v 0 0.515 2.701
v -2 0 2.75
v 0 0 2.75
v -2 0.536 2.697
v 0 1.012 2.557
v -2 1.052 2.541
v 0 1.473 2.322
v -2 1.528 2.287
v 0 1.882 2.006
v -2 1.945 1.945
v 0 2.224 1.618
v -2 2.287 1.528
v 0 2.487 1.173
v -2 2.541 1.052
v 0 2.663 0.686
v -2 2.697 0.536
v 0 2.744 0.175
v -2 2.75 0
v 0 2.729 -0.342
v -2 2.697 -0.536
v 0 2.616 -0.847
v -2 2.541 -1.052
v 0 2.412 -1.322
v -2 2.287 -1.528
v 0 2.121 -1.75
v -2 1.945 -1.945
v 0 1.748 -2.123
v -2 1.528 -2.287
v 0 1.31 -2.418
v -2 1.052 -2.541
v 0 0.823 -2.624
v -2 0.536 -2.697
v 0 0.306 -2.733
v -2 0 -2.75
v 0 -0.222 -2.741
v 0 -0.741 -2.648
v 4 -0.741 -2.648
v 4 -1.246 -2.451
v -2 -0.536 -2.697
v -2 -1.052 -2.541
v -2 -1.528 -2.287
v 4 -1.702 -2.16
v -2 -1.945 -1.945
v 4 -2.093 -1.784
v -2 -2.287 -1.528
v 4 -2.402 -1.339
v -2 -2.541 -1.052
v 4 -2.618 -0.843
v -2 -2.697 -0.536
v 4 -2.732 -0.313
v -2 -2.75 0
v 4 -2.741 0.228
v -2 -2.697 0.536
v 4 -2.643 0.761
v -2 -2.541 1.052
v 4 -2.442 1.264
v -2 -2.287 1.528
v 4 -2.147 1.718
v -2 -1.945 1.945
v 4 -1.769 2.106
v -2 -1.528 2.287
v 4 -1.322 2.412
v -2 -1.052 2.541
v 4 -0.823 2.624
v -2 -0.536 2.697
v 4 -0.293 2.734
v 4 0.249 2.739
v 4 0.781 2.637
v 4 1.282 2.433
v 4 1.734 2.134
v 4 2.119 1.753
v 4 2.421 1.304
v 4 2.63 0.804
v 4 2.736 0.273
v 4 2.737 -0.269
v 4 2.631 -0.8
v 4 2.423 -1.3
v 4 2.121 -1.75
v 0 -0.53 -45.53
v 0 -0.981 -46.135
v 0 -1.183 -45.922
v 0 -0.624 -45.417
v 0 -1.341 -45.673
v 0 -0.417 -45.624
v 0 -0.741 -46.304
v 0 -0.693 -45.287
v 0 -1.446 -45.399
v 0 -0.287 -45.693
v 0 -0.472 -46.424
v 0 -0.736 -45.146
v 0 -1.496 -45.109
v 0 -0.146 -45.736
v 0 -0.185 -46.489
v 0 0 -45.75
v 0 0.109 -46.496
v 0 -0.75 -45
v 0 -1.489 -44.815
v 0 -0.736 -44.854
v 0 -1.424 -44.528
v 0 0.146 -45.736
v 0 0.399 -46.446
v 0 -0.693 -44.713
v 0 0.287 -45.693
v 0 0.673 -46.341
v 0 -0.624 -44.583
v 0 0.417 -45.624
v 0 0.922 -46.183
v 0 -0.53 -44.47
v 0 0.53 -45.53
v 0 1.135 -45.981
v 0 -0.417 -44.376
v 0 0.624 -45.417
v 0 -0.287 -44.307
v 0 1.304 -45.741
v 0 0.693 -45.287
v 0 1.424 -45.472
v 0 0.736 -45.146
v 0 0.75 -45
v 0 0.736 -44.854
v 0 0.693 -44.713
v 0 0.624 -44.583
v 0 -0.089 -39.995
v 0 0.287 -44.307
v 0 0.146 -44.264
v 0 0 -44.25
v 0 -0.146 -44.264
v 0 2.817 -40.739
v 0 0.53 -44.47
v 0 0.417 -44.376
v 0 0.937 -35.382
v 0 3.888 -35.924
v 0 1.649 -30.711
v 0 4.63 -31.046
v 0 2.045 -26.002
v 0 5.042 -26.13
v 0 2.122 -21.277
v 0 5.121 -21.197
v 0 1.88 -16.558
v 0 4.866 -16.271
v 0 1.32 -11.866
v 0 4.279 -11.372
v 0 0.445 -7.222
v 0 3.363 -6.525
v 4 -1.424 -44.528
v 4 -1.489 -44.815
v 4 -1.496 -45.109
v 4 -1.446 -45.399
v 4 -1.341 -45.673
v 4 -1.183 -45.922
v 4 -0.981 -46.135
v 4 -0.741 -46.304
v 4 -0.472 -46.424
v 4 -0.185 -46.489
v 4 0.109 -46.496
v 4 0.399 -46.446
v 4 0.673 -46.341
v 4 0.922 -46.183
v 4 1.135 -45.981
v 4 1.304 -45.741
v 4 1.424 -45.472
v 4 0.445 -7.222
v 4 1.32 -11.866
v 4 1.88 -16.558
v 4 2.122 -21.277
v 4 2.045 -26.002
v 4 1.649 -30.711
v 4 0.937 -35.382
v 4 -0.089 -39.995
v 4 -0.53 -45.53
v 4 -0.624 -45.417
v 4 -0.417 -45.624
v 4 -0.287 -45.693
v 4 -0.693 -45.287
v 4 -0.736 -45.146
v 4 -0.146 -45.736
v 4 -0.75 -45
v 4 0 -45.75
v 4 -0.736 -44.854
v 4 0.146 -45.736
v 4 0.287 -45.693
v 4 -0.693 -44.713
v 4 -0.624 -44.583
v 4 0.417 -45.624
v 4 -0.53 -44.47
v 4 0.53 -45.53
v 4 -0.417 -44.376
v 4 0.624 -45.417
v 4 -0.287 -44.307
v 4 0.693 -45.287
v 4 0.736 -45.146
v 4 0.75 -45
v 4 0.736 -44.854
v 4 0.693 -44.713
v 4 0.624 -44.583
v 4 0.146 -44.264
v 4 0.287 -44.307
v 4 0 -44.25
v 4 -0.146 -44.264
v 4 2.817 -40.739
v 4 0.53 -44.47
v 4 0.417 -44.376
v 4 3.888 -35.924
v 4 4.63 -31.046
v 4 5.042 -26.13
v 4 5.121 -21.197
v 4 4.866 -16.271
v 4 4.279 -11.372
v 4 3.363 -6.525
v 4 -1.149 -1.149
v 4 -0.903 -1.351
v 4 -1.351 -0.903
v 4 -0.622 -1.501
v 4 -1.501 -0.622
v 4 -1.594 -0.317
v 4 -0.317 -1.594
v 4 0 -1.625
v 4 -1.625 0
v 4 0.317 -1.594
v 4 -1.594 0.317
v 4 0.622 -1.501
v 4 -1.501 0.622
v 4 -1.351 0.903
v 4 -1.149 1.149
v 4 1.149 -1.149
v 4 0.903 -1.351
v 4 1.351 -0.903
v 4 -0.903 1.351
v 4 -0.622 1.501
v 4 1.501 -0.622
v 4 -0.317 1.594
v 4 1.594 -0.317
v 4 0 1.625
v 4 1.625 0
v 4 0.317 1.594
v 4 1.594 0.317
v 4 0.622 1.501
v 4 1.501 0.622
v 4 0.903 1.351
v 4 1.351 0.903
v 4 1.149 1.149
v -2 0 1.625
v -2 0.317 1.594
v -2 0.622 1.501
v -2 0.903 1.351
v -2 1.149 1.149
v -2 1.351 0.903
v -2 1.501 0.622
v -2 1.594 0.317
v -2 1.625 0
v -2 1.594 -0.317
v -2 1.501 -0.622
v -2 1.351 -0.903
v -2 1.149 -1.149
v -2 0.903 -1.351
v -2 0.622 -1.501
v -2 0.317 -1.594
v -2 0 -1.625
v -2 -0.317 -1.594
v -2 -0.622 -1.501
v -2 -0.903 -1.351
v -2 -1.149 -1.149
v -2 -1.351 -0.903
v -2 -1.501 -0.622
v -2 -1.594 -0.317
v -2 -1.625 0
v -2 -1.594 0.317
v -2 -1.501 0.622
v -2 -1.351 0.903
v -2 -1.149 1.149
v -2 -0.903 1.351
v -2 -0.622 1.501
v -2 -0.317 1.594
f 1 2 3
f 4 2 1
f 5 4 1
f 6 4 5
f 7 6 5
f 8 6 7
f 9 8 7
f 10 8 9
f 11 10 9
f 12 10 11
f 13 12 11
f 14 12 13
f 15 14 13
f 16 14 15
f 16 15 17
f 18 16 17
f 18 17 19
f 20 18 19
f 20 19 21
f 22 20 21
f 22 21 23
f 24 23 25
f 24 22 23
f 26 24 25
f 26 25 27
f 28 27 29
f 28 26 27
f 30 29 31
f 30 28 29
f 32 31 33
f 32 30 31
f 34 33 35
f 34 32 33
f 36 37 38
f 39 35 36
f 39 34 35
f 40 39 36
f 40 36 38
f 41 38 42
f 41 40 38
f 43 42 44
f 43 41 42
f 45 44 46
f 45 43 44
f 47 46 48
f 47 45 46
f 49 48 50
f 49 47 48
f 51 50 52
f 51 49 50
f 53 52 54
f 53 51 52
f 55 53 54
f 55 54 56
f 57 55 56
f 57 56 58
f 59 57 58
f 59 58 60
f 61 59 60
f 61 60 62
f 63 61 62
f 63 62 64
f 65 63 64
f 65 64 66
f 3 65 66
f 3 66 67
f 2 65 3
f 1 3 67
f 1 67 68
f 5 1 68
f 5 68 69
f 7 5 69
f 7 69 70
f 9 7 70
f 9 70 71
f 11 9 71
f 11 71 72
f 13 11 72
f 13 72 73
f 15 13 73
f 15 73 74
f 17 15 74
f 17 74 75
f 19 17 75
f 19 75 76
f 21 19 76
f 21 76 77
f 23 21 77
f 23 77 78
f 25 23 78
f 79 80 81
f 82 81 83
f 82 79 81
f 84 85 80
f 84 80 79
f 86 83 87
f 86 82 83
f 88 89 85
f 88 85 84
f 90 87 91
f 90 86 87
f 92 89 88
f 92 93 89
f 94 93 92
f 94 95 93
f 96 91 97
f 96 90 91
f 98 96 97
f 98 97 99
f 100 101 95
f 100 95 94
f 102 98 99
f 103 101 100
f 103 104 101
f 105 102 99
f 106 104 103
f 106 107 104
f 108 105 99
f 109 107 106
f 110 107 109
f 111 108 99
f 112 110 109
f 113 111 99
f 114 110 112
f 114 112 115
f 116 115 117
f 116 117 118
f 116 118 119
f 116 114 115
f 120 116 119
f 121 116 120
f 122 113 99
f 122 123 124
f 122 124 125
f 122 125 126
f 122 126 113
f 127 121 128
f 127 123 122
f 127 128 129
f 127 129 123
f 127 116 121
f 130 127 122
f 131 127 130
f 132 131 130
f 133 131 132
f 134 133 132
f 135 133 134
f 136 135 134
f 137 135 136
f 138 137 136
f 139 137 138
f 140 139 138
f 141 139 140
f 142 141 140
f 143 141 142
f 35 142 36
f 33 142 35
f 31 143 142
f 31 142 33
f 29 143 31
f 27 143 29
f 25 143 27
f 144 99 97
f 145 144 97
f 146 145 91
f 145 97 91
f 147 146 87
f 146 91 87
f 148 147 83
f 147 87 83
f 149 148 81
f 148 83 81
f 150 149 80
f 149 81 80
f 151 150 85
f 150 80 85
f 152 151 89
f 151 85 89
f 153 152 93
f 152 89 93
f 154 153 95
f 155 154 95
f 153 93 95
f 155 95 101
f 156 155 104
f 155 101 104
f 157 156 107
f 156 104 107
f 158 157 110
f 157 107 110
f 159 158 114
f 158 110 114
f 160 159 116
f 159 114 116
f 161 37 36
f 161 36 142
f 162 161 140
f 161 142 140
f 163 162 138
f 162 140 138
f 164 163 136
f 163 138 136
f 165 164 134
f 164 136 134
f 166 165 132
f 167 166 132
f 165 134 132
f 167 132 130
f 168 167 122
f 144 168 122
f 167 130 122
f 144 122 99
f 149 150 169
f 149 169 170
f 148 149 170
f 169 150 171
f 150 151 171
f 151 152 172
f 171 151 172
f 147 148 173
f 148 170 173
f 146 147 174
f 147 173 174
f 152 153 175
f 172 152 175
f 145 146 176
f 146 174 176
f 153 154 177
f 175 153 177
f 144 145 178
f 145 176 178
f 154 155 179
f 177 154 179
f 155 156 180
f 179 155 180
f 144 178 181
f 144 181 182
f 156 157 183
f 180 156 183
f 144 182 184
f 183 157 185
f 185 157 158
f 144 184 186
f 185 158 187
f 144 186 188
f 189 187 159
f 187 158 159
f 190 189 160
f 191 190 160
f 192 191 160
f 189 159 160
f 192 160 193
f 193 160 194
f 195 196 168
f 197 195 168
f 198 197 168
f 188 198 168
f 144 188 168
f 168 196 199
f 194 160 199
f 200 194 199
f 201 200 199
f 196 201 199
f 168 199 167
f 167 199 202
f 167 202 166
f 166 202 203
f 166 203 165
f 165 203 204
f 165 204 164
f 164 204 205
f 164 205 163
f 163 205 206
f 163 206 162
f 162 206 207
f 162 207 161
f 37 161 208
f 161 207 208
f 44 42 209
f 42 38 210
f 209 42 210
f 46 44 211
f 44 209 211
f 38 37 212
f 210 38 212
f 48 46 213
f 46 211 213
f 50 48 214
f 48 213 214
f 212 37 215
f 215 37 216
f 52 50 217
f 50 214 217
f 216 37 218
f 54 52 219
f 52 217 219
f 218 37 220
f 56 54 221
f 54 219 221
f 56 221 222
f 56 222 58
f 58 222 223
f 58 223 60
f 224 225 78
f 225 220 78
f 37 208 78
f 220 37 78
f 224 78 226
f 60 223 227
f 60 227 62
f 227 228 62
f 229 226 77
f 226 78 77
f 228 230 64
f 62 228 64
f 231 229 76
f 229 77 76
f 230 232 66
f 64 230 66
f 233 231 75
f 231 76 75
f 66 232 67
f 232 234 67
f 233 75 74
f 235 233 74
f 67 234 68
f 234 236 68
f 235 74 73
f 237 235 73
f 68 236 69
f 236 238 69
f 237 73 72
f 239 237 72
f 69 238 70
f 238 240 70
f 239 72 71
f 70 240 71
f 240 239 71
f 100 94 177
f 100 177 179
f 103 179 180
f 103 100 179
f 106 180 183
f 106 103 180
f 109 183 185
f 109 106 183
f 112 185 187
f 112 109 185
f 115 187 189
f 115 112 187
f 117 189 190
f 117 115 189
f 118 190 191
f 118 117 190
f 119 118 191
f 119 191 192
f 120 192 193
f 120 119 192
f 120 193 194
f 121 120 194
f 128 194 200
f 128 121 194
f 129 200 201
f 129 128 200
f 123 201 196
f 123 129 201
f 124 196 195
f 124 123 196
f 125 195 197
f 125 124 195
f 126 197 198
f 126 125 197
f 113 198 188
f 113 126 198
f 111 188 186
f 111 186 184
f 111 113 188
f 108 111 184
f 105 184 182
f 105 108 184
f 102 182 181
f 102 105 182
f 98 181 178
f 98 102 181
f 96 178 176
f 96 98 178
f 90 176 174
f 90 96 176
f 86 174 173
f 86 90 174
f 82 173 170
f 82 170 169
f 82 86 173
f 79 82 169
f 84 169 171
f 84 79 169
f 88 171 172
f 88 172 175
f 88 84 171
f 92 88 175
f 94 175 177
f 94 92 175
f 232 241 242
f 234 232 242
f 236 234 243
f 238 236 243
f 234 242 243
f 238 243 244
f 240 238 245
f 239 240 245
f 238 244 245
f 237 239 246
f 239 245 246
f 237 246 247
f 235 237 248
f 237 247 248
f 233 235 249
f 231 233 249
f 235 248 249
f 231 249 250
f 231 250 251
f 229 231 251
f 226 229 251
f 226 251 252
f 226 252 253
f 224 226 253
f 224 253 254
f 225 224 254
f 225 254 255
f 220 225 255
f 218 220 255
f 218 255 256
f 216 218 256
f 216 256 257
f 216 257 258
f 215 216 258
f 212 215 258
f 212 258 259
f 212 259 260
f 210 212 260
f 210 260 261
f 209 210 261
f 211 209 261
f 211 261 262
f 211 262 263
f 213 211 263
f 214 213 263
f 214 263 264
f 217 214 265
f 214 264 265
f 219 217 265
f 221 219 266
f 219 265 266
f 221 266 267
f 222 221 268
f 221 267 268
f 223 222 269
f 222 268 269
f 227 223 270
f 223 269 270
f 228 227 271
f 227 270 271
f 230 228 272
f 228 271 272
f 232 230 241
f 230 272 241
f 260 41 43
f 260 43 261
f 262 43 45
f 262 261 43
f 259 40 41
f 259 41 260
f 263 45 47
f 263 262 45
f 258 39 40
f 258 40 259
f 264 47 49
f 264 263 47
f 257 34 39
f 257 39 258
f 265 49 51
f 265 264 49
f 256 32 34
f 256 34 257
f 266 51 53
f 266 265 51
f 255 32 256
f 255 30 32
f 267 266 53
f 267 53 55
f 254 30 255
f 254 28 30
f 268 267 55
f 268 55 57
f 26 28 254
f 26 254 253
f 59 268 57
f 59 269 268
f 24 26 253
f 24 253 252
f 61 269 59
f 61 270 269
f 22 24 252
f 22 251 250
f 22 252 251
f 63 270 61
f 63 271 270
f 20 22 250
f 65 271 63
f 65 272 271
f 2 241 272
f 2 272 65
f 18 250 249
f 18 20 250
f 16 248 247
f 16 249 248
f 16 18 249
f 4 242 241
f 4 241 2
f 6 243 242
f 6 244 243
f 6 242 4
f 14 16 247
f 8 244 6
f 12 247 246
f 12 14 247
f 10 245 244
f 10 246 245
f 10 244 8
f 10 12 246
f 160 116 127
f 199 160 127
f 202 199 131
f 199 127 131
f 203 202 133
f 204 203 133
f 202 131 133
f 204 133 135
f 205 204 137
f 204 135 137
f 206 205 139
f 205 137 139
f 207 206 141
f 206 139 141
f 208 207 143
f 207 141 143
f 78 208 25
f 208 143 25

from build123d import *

# Parameters (mm, degrees)
SKETCH1_R           = 0.75
BOSS_EXTRUDE1_DEPTH = 4
SKETCH3_R           = 2.75
BOSS_EXTRUDE3_DEPTH = 4
SKETCH4_R           = 1.625
CUT_EXTRUDE1_DEPTH  = 4
BOSS_EXTRUDE4_START = 2
SKETCH5_R           = 2.75
SKETCH5_R_2         = 1.625
BOSS_EXTRUDE4_DEPTH = 2


with BuildPart() as part:
    # Sketch1 → Boss-Extrude1 (new body)
    with BuildSketch(Plane(origin=(0, 0, 0), x_dir=(0, 0, -1), z_dir=(1, 0, 0))):
        with BuildLine():
            ThreePointArc((-0.472027972, 1.423794084), (-1.423794084, -0.472027972), (0.472027972, -1.423794084))
            ThreePointArc((0.472027972, -1.423794084), (22.5, 2.132481996), (44.527972028, -1.423794084))
            ThreePointArc((44.527972028, -1.423794084), (46.423794084, -0.472027972), (45.472027972, 1.423794084))
            ThreePointArc((45.472027972, 1.423794084), (22.5, 5.132481996), (-0.472027972, 1.423794084))
        make_face()
        with Locations((45, 0)):
            Circle(SKETCH1_R, mode=Mode.SUBTRACT)
    extrude(amount=BOSS_EXTRUDE1_DEPTH)

    # Sketch3 → Boss-Extrude3 (add)
    with BuildSketch(Plane.ZY):
        Circle(SKETCH3_R)
    extrude(amount=-BOSS_EXTRUDE3_DEPTH)

    # Sketch4 → Cut-Extrude1 (cut)
    with BuildSketch(Plane.ZY):
        Circle(SKETCH4_R)
    extrude(amount=-CUT_EXTRUDE1_DEPTH, mode=Mode.SUBTRACT)

    # Sketch5 → Boss-Extrude4 (add)
    with BuildSketch(Plane.ZY.offset(BOSS_EXTRUDE4_START)):
        Circle(SKETCH5_R)
        Circle(SKETCH5_R_2, mode=Mode.SUBTRACT)
    extrude(amount=-BOSS_EXTRUDE4_DEPTH)


solid = part.part
